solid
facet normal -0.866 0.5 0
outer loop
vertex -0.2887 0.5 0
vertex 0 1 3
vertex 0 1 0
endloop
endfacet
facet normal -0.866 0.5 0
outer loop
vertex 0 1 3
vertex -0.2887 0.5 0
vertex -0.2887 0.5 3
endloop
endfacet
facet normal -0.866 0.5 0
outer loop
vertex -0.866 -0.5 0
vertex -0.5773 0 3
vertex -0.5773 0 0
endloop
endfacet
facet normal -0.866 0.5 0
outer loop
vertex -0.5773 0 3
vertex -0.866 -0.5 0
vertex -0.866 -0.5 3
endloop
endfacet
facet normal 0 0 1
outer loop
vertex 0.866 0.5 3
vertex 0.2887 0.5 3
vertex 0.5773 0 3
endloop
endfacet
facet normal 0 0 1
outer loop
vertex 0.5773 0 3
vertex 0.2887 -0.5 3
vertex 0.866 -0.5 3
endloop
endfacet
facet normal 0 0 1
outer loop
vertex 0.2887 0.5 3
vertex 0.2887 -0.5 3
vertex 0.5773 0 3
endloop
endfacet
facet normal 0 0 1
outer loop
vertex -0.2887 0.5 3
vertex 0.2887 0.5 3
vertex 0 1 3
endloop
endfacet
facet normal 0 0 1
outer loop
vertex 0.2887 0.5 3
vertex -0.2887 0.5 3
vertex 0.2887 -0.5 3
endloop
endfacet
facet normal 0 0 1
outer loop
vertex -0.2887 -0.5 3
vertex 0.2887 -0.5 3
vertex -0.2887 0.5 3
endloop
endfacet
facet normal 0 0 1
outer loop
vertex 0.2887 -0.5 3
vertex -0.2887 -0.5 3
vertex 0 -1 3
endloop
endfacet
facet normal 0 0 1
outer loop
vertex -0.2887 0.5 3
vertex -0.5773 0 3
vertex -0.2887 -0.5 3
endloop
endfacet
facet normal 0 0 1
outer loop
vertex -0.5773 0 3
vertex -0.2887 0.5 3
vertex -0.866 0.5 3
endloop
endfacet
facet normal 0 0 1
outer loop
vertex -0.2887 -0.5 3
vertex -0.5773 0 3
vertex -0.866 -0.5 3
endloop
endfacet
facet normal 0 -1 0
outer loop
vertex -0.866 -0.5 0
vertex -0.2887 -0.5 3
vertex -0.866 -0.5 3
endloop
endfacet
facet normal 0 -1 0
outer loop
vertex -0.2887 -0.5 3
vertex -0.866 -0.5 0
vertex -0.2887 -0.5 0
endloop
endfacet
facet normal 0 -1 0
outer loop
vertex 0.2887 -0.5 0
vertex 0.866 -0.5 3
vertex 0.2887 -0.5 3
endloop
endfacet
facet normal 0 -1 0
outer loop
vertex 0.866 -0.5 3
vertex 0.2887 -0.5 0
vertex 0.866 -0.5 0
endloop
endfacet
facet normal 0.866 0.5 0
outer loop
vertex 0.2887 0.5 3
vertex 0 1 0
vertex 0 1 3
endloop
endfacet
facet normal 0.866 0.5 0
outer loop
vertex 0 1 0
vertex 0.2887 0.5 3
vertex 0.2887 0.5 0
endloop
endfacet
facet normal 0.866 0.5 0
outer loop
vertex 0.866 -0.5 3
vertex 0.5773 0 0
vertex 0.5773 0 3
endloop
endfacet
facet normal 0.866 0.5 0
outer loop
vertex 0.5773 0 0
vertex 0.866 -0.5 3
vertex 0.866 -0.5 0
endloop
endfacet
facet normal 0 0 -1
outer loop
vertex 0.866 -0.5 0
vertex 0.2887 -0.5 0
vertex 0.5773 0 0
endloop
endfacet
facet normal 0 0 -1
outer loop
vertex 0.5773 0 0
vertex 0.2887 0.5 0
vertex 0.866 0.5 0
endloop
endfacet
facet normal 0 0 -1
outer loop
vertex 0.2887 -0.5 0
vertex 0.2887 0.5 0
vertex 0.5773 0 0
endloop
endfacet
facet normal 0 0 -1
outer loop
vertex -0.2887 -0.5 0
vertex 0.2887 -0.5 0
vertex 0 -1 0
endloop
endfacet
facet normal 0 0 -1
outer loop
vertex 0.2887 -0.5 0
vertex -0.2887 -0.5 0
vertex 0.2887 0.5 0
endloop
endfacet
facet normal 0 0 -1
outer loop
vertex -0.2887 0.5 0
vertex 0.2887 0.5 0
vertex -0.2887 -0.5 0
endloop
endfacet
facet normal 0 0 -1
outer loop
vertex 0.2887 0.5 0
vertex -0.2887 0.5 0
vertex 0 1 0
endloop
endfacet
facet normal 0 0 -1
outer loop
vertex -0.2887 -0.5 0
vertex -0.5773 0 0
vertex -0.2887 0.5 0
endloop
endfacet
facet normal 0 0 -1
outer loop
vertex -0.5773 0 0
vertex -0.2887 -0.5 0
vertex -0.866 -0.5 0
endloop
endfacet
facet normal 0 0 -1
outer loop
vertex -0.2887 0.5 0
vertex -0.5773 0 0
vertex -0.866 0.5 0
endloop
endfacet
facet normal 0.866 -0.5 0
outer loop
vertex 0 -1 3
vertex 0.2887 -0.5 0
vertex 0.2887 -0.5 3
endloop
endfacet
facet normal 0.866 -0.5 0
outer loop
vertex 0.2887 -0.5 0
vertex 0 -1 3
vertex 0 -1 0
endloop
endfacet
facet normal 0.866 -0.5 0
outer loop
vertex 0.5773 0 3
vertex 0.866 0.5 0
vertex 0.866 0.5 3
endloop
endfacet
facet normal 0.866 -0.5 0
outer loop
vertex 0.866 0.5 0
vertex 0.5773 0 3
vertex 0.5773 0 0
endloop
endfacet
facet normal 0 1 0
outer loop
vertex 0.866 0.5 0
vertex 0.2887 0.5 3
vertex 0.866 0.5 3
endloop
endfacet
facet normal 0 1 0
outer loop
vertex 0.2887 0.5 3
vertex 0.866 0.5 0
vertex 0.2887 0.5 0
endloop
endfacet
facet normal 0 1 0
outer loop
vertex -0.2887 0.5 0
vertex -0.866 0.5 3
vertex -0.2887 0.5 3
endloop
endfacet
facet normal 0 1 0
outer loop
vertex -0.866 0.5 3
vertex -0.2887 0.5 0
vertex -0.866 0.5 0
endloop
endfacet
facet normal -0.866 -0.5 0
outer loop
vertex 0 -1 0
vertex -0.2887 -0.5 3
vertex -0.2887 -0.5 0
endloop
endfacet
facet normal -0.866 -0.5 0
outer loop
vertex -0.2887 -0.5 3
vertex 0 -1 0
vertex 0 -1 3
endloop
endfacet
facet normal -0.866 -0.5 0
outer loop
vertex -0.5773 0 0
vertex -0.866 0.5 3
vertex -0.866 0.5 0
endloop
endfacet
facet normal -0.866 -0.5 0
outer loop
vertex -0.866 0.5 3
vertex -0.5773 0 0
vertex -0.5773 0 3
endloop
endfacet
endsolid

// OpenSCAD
// file: ../../../trees/christmas/christmas-tree.scad
christmasTree();

module christmasTree(height = 3)
{
    union()
    {
        // top triangle
        translate([0, 30, 0])
        triangle(10, height);
        
        // middle triangle
        translate([0, 15, 0])
        color("green")
        triangle(15, height);
        
        // bottom triangle
        triangle(20, height);
        
        // trunk
        color("brown")
        translate([-2.5, -15, 0])
        cube([5,6, height]);
    }
}

module triangle(size, height)
{
    rotate([0, 0, 90])
    cylinder(r=size, 
             $fn=3,
             h=height);
}
// main file
use <../../../trees/christmas/christmas-tree.scad>

starOfDavid();

module starOfDavid()
{
    height = 3;
    
    union()
    {
        triangle(height = height);
        
        rotate([0, 0, 180])
        color("green")
        triangle(height = height);
    }
}
